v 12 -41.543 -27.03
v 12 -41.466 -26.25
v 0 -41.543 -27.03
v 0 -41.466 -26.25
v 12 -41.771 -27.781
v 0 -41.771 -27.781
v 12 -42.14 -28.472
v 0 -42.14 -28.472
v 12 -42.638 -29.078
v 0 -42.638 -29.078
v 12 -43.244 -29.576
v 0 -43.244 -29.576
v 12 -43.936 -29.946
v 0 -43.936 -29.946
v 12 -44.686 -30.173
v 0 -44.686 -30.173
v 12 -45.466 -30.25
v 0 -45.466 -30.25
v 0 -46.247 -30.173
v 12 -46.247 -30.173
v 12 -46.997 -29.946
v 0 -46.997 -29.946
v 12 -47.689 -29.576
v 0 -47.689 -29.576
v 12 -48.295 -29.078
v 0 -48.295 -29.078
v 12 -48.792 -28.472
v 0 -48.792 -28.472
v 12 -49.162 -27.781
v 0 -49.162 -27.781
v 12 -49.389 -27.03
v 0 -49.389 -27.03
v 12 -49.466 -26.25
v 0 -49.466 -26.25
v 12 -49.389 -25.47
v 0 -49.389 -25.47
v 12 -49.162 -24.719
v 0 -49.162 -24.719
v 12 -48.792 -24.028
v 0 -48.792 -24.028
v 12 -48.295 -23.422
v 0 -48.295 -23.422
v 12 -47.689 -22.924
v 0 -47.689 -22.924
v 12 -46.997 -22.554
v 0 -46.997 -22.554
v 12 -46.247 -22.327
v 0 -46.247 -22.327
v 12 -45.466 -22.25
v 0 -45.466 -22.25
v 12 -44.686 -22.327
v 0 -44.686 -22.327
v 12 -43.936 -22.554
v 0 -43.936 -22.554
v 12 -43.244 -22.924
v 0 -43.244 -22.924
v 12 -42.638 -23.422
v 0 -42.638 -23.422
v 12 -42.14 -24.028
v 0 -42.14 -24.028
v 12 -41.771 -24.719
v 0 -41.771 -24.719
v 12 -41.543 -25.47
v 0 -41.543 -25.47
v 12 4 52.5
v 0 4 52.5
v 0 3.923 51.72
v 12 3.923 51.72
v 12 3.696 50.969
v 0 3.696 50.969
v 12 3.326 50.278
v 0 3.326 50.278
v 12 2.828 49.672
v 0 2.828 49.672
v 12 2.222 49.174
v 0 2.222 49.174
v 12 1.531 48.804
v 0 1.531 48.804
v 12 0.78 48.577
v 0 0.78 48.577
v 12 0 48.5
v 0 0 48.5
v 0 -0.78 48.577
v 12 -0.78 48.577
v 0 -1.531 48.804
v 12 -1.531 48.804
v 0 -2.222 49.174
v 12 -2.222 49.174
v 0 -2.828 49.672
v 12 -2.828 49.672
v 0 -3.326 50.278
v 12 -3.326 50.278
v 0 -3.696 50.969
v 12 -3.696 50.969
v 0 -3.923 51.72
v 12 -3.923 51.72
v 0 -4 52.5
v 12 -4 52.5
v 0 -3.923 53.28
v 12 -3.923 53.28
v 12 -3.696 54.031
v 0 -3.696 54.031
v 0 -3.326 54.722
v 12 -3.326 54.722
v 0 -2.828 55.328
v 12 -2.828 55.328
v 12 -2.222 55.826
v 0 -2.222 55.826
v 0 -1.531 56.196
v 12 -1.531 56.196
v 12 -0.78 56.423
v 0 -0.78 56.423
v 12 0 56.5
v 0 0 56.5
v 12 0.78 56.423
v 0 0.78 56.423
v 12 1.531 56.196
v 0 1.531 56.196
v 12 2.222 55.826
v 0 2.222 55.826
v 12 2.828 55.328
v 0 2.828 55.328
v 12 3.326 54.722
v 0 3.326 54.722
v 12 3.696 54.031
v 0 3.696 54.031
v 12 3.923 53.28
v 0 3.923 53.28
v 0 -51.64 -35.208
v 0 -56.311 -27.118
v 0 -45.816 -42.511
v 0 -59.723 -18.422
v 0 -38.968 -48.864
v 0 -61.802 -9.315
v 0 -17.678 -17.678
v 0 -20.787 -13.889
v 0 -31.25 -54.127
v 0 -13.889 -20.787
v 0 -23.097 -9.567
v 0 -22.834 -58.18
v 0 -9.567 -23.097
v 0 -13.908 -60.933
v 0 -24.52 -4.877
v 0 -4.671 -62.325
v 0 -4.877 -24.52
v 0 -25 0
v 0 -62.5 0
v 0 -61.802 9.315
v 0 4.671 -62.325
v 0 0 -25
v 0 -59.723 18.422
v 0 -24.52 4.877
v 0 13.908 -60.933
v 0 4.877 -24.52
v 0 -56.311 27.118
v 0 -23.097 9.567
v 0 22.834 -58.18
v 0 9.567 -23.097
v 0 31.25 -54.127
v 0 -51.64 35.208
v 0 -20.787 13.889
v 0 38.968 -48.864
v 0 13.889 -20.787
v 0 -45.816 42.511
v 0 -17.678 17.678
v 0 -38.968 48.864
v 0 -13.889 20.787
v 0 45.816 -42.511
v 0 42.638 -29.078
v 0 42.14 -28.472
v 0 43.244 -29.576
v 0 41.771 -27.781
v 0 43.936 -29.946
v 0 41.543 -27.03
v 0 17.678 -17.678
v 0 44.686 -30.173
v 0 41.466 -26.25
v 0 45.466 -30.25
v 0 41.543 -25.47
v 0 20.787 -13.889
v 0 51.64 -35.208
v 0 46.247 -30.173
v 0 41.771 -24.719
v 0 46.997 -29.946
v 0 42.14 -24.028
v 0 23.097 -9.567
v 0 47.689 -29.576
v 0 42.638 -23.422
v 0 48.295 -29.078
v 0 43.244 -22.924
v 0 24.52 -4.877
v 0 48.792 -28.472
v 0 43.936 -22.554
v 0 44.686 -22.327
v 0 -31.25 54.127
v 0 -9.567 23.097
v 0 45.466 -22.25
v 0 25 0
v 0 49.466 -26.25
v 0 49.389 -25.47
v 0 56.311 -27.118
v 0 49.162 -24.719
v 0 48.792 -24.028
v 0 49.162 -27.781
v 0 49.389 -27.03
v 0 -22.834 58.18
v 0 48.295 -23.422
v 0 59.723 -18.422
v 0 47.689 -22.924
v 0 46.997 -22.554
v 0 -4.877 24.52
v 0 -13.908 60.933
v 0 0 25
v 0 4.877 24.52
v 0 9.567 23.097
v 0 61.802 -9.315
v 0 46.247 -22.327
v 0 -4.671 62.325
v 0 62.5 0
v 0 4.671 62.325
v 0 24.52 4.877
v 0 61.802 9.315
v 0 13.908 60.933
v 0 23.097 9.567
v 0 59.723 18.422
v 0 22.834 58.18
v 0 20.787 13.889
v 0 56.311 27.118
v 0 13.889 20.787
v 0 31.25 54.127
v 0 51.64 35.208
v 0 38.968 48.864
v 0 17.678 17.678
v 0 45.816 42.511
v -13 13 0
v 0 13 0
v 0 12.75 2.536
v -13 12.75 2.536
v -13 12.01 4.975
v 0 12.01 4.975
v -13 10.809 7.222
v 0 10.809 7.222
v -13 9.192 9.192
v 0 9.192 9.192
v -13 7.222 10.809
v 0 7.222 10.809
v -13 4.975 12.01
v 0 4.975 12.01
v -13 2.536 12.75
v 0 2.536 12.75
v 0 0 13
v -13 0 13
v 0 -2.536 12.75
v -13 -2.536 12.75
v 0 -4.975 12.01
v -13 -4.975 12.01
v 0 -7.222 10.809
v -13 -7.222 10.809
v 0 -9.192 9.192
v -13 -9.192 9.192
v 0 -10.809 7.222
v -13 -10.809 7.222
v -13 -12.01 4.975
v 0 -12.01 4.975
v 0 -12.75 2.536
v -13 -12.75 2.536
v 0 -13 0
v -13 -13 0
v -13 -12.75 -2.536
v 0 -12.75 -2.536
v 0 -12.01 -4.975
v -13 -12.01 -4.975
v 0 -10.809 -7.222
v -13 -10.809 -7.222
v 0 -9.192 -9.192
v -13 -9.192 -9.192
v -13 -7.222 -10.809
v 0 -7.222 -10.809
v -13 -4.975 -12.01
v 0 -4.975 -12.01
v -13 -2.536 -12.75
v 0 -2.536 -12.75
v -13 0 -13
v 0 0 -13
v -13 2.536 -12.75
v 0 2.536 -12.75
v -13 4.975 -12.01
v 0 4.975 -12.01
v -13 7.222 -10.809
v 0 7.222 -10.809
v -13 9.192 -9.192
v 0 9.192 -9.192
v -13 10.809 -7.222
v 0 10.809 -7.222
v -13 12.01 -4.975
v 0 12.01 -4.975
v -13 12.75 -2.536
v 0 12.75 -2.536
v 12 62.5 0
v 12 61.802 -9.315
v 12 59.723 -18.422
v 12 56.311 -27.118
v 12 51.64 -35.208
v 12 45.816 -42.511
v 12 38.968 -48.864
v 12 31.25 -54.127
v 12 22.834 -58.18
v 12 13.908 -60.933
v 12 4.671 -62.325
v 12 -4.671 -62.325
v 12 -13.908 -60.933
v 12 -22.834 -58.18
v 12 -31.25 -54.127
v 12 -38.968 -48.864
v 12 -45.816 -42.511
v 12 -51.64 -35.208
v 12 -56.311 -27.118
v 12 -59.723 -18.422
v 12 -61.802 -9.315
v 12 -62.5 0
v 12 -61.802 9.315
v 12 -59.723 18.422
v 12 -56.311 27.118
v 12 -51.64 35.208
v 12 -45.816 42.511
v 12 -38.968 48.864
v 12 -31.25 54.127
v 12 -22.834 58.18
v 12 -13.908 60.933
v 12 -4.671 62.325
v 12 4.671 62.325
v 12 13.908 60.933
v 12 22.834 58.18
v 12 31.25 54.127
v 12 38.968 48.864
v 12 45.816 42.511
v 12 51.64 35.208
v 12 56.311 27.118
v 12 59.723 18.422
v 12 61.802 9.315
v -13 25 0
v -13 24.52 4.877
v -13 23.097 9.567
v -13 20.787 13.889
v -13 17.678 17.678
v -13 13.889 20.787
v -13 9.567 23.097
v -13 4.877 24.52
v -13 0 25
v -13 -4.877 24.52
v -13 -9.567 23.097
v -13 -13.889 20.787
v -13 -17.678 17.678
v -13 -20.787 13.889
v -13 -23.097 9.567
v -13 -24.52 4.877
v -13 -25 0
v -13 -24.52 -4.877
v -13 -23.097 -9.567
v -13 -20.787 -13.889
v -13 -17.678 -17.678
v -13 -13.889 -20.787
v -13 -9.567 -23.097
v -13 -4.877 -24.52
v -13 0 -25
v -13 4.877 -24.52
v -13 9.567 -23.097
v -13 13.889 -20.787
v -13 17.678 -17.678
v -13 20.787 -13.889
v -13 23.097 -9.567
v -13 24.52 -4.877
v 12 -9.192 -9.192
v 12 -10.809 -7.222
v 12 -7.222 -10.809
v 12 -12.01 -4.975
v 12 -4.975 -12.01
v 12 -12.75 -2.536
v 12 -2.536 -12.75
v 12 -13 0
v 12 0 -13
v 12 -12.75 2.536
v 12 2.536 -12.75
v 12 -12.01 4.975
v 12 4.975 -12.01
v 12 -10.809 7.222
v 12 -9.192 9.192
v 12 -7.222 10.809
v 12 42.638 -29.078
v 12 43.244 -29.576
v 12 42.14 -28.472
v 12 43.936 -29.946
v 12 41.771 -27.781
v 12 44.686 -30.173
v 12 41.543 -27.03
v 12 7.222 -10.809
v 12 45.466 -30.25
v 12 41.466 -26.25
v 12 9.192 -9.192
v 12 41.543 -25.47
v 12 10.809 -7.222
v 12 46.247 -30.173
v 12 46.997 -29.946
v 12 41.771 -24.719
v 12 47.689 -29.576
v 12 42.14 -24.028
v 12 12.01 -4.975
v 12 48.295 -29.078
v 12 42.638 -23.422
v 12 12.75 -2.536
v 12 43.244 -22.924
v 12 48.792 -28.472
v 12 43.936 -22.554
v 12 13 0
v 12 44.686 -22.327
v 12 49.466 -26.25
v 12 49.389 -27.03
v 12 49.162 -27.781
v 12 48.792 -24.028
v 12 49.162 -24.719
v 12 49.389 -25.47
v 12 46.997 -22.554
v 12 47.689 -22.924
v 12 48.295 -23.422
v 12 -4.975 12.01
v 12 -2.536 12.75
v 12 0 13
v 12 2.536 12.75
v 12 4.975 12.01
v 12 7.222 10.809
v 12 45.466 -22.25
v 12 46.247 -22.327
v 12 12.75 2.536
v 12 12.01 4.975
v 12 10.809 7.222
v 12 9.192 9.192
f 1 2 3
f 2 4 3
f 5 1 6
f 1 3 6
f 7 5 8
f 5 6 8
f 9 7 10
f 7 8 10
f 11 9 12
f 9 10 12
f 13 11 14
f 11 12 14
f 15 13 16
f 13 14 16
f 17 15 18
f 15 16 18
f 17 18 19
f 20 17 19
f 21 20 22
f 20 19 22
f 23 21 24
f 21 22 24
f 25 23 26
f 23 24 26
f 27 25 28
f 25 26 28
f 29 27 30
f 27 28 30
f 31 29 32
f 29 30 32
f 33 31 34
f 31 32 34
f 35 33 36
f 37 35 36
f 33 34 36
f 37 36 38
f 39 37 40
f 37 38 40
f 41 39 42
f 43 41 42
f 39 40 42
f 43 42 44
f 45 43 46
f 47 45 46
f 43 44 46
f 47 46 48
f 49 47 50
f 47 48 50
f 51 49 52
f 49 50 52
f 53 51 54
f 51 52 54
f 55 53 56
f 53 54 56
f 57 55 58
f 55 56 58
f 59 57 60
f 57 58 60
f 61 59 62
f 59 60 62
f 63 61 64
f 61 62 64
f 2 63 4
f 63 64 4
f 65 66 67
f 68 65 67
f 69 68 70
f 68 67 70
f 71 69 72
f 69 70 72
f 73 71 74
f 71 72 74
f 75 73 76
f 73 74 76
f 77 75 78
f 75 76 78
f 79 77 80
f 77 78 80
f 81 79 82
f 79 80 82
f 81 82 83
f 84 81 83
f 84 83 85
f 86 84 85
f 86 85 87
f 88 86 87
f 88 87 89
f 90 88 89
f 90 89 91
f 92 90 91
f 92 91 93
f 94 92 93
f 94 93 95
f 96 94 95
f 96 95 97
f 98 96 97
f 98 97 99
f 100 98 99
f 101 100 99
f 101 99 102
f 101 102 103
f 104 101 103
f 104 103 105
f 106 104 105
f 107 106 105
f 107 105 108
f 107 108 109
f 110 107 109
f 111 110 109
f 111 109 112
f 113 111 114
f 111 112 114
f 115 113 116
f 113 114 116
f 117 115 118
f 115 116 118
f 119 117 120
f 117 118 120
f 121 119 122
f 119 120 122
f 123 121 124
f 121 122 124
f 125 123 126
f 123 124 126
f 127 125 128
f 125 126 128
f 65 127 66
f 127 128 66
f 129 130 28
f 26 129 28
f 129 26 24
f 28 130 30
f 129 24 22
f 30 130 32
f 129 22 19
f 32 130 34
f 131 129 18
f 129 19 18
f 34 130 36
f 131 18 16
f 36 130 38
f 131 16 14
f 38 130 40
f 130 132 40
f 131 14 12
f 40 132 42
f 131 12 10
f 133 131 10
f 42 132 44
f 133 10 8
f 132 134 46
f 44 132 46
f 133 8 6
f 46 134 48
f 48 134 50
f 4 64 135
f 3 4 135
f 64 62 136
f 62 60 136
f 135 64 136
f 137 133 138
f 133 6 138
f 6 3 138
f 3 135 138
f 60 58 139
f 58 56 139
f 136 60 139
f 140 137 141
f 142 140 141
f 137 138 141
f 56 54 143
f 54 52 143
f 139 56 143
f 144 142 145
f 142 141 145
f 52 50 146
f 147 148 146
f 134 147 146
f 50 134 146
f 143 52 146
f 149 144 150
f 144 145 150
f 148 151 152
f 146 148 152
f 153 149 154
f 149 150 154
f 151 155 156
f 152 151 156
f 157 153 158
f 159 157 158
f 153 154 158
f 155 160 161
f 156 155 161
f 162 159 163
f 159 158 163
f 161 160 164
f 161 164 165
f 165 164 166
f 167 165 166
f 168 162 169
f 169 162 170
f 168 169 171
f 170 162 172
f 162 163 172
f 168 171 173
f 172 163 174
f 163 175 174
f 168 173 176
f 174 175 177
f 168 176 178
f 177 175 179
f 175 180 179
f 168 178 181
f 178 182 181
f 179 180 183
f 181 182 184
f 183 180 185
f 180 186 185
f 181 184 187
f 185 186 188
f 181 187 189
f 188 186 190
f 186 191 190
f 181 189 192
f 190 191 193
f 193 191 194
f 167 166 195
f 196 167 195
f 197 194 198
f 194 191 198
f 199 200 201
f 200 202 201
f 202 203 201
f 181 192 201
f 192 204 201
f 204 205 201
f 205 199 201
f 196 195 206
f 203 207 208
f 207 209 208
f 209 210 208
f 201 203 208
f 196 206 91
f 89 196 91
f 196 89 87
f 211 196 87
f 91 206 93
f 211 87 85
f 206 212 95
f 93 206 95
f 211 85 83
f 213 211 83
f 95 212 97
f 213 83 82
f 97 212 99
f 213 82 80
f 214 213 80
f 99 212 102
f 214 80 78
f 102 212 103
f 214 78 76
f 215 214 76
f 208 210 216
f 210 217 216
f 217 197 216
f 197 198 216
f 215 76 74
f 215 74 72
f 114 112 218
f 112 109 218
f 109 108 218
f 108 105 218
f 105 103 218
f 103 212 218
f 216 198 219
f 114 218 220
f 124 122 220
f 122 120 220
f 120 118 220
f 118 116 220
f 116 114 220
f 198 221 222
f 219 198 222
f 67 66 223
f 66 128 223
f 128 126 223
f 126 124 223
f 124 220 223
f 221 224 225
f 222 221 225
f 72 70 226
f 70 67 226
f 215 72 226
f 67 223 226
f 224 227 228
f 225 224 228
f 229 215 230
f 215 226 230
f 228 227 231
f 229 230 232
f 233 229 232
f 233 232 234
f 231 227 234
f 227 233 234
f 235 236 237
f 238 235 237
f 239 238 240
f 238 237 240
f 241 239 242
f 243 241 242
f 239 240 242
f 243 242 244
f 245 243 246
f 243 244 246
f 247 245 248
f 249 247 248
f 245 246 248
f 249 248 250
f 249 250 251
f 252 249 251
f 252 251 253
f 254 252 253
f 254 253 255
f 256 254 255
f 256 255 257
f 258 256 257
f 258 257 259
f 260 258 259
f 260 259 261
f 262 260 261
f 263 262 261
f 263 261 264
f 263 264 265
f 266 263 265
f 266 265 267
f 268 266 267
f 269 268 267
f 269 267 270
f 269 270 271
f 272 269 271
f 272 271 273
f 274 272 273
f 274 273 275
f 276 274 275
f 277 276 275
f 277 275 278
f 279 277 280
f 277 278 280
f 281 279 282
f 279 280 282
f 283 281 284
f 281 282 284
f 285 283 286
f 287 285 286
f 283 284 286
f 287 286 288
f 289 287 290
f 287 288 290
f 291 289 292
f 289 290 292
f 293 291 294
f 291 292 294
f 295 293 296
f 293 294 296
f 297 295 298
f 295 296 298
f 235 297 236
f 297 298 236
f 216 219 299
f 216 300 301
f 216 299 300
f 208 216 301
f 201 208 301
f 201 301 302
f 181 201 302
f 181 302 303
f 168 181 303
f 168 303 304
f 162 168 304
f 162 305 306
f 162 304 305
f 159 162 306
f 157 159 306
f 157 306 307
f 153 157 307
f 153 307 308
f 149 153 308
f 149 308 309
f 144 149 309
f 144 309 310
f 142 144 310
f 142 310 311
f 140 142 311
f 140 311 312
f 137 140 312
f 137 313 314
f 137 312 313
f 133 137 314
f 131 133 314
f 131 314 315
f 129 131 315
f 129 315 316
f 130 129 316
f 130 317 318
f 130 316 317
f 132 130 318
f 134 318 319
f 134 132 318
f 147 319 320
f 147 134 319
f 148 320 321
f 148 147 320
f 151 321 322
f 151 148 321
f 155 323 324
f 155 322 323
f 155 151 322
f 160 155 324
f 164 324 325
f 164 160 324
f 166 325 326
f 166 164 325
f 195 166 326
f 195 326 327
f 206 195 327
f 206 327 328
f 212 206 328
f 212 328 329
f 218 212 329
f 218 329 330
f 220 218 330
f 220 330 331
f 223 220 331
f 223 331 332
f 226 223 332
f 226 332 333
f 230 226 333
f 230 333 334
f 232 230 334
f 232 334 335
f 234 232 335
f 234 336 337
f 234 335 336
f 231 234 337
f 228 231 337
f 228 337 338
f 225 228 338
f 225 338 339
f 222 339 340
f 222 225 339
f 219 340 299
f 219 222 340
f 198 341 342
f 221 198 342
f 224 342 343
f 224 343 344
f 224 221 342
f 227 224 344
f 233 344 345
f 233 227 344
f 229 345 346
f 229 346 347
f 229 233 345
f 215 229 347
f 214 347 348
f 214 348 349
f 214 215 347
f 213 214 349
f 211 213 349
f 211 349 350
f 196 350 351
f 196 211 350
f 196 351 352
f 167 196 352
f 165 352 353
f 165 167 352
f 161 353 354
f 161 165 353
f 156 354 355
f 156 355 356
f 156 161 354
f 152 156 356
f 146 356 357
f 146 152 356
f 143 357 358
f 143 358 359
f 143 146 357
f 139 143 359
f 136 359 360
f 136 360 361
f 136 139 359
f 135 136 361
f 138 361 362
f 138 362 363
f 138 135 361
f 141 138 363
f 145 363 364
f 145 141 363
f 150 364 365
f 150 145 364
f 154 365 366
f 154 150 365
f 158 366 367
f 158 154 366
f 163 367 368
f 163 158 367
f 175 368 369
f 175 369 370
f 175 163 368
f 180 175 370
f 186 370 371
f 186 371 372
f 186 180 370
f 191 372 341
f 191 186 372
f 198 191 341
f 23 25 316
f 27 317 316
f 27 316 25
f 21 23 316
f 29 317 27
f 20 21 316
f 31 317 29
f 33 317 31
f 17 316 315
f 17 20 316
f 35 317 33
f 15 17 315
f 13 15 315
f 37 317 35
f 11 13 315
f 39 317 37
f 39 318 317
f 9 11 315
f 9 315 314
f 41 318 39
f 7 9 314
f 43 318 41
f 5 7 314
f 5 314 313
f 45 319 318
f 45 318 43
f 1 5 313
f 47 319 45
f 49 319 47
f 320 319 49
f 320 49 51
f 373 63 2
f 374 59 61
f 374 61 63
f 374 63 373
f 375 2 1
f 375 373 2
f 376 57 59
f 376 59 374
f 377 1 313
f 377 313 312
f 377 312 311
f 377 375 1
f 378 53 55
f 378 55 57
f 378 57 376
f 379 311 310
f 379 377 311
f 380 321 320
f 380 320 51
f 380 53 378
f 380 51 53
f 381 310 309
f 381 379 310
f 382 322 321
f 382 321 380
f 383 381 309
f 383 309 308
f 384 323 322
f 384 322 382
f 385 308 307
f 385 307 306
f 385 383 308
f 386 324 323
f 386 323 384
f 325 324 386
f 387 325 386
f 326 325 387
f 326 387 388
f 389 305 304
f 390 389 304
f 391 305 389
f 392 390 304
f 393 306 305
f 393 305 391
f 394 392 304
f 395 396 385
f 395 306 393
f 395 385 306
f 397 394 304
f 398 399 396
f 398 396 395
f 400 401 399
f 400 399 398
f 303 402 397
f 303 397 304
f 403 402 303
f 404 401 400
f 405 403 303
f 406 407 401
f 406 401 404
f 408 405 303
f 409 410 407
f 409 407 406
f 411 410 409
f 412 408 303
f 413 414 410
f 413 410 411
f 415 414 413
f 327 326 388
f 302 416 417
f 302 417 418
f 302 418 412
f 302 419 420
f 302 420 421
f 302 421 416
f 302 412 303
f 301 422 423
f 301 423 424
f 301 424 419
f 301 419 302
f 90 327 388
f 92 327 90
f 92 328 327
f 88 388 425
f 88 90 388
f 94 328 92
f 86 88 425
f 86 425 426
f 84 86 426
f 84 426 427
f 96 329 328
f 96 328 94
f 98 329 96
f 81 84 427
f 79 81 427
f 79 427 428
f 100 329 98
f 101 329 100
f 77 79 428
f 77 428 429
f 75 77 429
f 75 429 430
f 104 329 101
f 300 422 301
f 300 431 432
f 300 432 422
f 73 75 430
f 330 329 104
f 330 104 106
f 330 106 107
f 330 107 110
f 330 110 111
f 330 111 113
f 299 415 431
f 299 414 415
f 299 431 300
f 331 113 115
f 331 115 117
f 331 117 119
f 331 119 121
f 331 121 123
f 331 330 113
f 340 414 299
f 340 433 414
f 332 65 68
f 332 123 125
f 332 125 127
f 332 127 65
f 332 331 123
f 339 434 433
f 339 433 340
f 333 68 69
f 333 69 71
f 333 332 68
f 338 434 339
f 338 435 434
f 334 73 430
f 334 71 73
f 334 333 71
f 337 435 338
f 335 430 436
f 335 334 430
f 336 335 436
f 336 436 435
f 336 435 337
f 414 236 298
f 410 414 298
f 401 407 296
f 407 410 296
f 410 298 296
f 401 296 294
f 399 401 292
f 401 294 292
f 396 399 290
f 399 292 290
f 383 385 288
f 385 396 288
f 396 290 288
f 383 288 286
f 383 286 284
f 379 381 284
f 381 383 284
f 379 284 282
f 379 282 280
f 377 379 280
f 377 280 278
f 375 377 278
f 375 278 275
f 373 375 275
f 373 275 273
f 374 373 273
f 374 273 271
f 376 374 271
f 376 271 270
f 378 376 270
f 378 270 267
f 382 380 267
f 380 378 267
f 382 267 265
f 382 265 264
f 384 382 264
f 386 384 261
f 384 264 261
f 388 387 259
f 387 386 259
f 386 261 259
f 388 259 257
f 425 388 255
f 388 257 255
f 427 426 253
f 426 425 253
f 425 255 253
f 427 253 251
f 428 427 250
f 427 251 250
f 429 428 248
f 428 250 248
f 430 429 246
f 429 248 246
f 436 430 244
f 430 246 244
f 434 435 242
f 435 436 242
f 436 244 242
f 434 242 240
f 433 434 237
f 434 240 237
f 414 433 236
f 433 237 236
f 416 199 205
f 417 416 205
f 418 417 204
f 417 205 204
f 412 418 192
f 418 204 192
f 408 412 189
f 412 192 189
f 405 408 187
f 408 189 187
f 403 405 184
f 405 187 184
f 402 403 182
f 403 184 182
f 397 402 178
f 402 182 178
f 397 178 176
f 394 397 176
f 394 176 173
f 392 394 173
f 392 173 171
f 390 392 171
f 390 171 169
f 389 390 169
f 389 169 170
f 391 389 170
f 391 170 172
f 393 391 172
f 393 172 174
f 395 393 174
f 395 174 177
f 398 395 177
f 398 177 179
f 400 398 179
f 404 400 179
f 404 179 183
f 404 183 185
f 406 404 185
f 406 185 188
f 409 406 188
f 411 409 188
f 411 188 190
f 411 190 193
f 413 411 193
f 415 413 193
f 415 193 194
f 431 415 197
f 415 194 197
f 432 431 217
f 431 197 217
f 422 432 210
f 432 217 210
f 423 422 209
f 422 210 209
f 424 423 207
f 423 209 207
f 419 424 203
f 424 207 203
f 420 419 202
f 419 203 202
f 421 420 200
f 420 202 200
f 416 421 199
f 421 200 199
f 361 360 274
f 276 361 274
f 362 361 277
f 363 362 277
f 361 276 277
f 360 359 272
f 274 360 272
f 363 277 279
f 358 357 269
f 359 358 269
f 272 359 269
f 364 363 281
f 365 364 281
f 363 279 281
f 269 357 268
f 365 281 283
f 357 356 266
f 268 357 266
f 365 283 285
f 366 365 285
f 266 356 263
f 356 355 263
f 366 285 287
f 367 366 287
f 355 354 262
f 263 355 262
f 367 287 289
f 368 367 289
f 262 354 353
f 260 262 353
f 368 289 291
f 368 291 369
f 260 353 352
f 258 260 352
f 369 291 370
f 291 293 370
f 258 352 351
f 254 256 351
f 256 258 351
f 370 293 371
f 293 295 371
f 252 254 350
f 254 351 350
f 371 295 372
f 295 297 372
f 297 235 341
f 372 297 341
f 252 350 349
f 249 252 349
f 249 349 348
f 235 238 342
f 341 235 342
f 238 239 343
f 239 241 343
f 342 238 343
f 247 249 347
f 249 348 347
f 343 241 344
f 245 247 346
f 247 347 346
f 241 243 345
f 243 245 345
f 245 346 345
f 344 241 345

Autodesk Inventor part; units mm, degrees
ref_plane "YZ Plane" through (0, 0, 0) normal (1, 0, 0) x (0, 1, 0)
ref_plane "XZ Plane" through (0, 0, 0) normal (0, 1, 0) x (-1, 0, 0)
ref_plane "XY Plane" through (0, 0, 0) normal (0, 0, 1) x (1, 0, 0)
sketch "Sketch1" plane through (0, 0, 0) normal (1, 0, 0) x (0, 1, 0)
  circle A0 centre (0, 0) radius 62.5
  circle A1 centre (0, 0) radius 25
  circle A2 centre (0, 0) radius 13
  circle A3 centre (0, 0) radius 52.5 construction
  circle A4 centre (0, 52.5) radius 4
  circle A5 centre (-45.4663, -26.25) radius 4
  circle A6 centre (45.4663, -26.25) radius 4
  dimension "d0" = 50
  dimension "d1" = 26
  dimension "d2" = 125
  dimension "d7" = 8
  dimension "d8" = 10
  dimension "d11" = 360
extrude "Extrusion1" add sketch "Sketch1" along normal blind 12 contours A0 | A1 | A4 | A5 | A6
extrude "Extrusion2" add sketch "Sketch1" against normal blind 13 contours A1
extrude "Extrusion3" cut sketch "Sketch1" along normal blind 45.5 contours A4 | A5 | A6
properties part number "Chuck Backplate"
